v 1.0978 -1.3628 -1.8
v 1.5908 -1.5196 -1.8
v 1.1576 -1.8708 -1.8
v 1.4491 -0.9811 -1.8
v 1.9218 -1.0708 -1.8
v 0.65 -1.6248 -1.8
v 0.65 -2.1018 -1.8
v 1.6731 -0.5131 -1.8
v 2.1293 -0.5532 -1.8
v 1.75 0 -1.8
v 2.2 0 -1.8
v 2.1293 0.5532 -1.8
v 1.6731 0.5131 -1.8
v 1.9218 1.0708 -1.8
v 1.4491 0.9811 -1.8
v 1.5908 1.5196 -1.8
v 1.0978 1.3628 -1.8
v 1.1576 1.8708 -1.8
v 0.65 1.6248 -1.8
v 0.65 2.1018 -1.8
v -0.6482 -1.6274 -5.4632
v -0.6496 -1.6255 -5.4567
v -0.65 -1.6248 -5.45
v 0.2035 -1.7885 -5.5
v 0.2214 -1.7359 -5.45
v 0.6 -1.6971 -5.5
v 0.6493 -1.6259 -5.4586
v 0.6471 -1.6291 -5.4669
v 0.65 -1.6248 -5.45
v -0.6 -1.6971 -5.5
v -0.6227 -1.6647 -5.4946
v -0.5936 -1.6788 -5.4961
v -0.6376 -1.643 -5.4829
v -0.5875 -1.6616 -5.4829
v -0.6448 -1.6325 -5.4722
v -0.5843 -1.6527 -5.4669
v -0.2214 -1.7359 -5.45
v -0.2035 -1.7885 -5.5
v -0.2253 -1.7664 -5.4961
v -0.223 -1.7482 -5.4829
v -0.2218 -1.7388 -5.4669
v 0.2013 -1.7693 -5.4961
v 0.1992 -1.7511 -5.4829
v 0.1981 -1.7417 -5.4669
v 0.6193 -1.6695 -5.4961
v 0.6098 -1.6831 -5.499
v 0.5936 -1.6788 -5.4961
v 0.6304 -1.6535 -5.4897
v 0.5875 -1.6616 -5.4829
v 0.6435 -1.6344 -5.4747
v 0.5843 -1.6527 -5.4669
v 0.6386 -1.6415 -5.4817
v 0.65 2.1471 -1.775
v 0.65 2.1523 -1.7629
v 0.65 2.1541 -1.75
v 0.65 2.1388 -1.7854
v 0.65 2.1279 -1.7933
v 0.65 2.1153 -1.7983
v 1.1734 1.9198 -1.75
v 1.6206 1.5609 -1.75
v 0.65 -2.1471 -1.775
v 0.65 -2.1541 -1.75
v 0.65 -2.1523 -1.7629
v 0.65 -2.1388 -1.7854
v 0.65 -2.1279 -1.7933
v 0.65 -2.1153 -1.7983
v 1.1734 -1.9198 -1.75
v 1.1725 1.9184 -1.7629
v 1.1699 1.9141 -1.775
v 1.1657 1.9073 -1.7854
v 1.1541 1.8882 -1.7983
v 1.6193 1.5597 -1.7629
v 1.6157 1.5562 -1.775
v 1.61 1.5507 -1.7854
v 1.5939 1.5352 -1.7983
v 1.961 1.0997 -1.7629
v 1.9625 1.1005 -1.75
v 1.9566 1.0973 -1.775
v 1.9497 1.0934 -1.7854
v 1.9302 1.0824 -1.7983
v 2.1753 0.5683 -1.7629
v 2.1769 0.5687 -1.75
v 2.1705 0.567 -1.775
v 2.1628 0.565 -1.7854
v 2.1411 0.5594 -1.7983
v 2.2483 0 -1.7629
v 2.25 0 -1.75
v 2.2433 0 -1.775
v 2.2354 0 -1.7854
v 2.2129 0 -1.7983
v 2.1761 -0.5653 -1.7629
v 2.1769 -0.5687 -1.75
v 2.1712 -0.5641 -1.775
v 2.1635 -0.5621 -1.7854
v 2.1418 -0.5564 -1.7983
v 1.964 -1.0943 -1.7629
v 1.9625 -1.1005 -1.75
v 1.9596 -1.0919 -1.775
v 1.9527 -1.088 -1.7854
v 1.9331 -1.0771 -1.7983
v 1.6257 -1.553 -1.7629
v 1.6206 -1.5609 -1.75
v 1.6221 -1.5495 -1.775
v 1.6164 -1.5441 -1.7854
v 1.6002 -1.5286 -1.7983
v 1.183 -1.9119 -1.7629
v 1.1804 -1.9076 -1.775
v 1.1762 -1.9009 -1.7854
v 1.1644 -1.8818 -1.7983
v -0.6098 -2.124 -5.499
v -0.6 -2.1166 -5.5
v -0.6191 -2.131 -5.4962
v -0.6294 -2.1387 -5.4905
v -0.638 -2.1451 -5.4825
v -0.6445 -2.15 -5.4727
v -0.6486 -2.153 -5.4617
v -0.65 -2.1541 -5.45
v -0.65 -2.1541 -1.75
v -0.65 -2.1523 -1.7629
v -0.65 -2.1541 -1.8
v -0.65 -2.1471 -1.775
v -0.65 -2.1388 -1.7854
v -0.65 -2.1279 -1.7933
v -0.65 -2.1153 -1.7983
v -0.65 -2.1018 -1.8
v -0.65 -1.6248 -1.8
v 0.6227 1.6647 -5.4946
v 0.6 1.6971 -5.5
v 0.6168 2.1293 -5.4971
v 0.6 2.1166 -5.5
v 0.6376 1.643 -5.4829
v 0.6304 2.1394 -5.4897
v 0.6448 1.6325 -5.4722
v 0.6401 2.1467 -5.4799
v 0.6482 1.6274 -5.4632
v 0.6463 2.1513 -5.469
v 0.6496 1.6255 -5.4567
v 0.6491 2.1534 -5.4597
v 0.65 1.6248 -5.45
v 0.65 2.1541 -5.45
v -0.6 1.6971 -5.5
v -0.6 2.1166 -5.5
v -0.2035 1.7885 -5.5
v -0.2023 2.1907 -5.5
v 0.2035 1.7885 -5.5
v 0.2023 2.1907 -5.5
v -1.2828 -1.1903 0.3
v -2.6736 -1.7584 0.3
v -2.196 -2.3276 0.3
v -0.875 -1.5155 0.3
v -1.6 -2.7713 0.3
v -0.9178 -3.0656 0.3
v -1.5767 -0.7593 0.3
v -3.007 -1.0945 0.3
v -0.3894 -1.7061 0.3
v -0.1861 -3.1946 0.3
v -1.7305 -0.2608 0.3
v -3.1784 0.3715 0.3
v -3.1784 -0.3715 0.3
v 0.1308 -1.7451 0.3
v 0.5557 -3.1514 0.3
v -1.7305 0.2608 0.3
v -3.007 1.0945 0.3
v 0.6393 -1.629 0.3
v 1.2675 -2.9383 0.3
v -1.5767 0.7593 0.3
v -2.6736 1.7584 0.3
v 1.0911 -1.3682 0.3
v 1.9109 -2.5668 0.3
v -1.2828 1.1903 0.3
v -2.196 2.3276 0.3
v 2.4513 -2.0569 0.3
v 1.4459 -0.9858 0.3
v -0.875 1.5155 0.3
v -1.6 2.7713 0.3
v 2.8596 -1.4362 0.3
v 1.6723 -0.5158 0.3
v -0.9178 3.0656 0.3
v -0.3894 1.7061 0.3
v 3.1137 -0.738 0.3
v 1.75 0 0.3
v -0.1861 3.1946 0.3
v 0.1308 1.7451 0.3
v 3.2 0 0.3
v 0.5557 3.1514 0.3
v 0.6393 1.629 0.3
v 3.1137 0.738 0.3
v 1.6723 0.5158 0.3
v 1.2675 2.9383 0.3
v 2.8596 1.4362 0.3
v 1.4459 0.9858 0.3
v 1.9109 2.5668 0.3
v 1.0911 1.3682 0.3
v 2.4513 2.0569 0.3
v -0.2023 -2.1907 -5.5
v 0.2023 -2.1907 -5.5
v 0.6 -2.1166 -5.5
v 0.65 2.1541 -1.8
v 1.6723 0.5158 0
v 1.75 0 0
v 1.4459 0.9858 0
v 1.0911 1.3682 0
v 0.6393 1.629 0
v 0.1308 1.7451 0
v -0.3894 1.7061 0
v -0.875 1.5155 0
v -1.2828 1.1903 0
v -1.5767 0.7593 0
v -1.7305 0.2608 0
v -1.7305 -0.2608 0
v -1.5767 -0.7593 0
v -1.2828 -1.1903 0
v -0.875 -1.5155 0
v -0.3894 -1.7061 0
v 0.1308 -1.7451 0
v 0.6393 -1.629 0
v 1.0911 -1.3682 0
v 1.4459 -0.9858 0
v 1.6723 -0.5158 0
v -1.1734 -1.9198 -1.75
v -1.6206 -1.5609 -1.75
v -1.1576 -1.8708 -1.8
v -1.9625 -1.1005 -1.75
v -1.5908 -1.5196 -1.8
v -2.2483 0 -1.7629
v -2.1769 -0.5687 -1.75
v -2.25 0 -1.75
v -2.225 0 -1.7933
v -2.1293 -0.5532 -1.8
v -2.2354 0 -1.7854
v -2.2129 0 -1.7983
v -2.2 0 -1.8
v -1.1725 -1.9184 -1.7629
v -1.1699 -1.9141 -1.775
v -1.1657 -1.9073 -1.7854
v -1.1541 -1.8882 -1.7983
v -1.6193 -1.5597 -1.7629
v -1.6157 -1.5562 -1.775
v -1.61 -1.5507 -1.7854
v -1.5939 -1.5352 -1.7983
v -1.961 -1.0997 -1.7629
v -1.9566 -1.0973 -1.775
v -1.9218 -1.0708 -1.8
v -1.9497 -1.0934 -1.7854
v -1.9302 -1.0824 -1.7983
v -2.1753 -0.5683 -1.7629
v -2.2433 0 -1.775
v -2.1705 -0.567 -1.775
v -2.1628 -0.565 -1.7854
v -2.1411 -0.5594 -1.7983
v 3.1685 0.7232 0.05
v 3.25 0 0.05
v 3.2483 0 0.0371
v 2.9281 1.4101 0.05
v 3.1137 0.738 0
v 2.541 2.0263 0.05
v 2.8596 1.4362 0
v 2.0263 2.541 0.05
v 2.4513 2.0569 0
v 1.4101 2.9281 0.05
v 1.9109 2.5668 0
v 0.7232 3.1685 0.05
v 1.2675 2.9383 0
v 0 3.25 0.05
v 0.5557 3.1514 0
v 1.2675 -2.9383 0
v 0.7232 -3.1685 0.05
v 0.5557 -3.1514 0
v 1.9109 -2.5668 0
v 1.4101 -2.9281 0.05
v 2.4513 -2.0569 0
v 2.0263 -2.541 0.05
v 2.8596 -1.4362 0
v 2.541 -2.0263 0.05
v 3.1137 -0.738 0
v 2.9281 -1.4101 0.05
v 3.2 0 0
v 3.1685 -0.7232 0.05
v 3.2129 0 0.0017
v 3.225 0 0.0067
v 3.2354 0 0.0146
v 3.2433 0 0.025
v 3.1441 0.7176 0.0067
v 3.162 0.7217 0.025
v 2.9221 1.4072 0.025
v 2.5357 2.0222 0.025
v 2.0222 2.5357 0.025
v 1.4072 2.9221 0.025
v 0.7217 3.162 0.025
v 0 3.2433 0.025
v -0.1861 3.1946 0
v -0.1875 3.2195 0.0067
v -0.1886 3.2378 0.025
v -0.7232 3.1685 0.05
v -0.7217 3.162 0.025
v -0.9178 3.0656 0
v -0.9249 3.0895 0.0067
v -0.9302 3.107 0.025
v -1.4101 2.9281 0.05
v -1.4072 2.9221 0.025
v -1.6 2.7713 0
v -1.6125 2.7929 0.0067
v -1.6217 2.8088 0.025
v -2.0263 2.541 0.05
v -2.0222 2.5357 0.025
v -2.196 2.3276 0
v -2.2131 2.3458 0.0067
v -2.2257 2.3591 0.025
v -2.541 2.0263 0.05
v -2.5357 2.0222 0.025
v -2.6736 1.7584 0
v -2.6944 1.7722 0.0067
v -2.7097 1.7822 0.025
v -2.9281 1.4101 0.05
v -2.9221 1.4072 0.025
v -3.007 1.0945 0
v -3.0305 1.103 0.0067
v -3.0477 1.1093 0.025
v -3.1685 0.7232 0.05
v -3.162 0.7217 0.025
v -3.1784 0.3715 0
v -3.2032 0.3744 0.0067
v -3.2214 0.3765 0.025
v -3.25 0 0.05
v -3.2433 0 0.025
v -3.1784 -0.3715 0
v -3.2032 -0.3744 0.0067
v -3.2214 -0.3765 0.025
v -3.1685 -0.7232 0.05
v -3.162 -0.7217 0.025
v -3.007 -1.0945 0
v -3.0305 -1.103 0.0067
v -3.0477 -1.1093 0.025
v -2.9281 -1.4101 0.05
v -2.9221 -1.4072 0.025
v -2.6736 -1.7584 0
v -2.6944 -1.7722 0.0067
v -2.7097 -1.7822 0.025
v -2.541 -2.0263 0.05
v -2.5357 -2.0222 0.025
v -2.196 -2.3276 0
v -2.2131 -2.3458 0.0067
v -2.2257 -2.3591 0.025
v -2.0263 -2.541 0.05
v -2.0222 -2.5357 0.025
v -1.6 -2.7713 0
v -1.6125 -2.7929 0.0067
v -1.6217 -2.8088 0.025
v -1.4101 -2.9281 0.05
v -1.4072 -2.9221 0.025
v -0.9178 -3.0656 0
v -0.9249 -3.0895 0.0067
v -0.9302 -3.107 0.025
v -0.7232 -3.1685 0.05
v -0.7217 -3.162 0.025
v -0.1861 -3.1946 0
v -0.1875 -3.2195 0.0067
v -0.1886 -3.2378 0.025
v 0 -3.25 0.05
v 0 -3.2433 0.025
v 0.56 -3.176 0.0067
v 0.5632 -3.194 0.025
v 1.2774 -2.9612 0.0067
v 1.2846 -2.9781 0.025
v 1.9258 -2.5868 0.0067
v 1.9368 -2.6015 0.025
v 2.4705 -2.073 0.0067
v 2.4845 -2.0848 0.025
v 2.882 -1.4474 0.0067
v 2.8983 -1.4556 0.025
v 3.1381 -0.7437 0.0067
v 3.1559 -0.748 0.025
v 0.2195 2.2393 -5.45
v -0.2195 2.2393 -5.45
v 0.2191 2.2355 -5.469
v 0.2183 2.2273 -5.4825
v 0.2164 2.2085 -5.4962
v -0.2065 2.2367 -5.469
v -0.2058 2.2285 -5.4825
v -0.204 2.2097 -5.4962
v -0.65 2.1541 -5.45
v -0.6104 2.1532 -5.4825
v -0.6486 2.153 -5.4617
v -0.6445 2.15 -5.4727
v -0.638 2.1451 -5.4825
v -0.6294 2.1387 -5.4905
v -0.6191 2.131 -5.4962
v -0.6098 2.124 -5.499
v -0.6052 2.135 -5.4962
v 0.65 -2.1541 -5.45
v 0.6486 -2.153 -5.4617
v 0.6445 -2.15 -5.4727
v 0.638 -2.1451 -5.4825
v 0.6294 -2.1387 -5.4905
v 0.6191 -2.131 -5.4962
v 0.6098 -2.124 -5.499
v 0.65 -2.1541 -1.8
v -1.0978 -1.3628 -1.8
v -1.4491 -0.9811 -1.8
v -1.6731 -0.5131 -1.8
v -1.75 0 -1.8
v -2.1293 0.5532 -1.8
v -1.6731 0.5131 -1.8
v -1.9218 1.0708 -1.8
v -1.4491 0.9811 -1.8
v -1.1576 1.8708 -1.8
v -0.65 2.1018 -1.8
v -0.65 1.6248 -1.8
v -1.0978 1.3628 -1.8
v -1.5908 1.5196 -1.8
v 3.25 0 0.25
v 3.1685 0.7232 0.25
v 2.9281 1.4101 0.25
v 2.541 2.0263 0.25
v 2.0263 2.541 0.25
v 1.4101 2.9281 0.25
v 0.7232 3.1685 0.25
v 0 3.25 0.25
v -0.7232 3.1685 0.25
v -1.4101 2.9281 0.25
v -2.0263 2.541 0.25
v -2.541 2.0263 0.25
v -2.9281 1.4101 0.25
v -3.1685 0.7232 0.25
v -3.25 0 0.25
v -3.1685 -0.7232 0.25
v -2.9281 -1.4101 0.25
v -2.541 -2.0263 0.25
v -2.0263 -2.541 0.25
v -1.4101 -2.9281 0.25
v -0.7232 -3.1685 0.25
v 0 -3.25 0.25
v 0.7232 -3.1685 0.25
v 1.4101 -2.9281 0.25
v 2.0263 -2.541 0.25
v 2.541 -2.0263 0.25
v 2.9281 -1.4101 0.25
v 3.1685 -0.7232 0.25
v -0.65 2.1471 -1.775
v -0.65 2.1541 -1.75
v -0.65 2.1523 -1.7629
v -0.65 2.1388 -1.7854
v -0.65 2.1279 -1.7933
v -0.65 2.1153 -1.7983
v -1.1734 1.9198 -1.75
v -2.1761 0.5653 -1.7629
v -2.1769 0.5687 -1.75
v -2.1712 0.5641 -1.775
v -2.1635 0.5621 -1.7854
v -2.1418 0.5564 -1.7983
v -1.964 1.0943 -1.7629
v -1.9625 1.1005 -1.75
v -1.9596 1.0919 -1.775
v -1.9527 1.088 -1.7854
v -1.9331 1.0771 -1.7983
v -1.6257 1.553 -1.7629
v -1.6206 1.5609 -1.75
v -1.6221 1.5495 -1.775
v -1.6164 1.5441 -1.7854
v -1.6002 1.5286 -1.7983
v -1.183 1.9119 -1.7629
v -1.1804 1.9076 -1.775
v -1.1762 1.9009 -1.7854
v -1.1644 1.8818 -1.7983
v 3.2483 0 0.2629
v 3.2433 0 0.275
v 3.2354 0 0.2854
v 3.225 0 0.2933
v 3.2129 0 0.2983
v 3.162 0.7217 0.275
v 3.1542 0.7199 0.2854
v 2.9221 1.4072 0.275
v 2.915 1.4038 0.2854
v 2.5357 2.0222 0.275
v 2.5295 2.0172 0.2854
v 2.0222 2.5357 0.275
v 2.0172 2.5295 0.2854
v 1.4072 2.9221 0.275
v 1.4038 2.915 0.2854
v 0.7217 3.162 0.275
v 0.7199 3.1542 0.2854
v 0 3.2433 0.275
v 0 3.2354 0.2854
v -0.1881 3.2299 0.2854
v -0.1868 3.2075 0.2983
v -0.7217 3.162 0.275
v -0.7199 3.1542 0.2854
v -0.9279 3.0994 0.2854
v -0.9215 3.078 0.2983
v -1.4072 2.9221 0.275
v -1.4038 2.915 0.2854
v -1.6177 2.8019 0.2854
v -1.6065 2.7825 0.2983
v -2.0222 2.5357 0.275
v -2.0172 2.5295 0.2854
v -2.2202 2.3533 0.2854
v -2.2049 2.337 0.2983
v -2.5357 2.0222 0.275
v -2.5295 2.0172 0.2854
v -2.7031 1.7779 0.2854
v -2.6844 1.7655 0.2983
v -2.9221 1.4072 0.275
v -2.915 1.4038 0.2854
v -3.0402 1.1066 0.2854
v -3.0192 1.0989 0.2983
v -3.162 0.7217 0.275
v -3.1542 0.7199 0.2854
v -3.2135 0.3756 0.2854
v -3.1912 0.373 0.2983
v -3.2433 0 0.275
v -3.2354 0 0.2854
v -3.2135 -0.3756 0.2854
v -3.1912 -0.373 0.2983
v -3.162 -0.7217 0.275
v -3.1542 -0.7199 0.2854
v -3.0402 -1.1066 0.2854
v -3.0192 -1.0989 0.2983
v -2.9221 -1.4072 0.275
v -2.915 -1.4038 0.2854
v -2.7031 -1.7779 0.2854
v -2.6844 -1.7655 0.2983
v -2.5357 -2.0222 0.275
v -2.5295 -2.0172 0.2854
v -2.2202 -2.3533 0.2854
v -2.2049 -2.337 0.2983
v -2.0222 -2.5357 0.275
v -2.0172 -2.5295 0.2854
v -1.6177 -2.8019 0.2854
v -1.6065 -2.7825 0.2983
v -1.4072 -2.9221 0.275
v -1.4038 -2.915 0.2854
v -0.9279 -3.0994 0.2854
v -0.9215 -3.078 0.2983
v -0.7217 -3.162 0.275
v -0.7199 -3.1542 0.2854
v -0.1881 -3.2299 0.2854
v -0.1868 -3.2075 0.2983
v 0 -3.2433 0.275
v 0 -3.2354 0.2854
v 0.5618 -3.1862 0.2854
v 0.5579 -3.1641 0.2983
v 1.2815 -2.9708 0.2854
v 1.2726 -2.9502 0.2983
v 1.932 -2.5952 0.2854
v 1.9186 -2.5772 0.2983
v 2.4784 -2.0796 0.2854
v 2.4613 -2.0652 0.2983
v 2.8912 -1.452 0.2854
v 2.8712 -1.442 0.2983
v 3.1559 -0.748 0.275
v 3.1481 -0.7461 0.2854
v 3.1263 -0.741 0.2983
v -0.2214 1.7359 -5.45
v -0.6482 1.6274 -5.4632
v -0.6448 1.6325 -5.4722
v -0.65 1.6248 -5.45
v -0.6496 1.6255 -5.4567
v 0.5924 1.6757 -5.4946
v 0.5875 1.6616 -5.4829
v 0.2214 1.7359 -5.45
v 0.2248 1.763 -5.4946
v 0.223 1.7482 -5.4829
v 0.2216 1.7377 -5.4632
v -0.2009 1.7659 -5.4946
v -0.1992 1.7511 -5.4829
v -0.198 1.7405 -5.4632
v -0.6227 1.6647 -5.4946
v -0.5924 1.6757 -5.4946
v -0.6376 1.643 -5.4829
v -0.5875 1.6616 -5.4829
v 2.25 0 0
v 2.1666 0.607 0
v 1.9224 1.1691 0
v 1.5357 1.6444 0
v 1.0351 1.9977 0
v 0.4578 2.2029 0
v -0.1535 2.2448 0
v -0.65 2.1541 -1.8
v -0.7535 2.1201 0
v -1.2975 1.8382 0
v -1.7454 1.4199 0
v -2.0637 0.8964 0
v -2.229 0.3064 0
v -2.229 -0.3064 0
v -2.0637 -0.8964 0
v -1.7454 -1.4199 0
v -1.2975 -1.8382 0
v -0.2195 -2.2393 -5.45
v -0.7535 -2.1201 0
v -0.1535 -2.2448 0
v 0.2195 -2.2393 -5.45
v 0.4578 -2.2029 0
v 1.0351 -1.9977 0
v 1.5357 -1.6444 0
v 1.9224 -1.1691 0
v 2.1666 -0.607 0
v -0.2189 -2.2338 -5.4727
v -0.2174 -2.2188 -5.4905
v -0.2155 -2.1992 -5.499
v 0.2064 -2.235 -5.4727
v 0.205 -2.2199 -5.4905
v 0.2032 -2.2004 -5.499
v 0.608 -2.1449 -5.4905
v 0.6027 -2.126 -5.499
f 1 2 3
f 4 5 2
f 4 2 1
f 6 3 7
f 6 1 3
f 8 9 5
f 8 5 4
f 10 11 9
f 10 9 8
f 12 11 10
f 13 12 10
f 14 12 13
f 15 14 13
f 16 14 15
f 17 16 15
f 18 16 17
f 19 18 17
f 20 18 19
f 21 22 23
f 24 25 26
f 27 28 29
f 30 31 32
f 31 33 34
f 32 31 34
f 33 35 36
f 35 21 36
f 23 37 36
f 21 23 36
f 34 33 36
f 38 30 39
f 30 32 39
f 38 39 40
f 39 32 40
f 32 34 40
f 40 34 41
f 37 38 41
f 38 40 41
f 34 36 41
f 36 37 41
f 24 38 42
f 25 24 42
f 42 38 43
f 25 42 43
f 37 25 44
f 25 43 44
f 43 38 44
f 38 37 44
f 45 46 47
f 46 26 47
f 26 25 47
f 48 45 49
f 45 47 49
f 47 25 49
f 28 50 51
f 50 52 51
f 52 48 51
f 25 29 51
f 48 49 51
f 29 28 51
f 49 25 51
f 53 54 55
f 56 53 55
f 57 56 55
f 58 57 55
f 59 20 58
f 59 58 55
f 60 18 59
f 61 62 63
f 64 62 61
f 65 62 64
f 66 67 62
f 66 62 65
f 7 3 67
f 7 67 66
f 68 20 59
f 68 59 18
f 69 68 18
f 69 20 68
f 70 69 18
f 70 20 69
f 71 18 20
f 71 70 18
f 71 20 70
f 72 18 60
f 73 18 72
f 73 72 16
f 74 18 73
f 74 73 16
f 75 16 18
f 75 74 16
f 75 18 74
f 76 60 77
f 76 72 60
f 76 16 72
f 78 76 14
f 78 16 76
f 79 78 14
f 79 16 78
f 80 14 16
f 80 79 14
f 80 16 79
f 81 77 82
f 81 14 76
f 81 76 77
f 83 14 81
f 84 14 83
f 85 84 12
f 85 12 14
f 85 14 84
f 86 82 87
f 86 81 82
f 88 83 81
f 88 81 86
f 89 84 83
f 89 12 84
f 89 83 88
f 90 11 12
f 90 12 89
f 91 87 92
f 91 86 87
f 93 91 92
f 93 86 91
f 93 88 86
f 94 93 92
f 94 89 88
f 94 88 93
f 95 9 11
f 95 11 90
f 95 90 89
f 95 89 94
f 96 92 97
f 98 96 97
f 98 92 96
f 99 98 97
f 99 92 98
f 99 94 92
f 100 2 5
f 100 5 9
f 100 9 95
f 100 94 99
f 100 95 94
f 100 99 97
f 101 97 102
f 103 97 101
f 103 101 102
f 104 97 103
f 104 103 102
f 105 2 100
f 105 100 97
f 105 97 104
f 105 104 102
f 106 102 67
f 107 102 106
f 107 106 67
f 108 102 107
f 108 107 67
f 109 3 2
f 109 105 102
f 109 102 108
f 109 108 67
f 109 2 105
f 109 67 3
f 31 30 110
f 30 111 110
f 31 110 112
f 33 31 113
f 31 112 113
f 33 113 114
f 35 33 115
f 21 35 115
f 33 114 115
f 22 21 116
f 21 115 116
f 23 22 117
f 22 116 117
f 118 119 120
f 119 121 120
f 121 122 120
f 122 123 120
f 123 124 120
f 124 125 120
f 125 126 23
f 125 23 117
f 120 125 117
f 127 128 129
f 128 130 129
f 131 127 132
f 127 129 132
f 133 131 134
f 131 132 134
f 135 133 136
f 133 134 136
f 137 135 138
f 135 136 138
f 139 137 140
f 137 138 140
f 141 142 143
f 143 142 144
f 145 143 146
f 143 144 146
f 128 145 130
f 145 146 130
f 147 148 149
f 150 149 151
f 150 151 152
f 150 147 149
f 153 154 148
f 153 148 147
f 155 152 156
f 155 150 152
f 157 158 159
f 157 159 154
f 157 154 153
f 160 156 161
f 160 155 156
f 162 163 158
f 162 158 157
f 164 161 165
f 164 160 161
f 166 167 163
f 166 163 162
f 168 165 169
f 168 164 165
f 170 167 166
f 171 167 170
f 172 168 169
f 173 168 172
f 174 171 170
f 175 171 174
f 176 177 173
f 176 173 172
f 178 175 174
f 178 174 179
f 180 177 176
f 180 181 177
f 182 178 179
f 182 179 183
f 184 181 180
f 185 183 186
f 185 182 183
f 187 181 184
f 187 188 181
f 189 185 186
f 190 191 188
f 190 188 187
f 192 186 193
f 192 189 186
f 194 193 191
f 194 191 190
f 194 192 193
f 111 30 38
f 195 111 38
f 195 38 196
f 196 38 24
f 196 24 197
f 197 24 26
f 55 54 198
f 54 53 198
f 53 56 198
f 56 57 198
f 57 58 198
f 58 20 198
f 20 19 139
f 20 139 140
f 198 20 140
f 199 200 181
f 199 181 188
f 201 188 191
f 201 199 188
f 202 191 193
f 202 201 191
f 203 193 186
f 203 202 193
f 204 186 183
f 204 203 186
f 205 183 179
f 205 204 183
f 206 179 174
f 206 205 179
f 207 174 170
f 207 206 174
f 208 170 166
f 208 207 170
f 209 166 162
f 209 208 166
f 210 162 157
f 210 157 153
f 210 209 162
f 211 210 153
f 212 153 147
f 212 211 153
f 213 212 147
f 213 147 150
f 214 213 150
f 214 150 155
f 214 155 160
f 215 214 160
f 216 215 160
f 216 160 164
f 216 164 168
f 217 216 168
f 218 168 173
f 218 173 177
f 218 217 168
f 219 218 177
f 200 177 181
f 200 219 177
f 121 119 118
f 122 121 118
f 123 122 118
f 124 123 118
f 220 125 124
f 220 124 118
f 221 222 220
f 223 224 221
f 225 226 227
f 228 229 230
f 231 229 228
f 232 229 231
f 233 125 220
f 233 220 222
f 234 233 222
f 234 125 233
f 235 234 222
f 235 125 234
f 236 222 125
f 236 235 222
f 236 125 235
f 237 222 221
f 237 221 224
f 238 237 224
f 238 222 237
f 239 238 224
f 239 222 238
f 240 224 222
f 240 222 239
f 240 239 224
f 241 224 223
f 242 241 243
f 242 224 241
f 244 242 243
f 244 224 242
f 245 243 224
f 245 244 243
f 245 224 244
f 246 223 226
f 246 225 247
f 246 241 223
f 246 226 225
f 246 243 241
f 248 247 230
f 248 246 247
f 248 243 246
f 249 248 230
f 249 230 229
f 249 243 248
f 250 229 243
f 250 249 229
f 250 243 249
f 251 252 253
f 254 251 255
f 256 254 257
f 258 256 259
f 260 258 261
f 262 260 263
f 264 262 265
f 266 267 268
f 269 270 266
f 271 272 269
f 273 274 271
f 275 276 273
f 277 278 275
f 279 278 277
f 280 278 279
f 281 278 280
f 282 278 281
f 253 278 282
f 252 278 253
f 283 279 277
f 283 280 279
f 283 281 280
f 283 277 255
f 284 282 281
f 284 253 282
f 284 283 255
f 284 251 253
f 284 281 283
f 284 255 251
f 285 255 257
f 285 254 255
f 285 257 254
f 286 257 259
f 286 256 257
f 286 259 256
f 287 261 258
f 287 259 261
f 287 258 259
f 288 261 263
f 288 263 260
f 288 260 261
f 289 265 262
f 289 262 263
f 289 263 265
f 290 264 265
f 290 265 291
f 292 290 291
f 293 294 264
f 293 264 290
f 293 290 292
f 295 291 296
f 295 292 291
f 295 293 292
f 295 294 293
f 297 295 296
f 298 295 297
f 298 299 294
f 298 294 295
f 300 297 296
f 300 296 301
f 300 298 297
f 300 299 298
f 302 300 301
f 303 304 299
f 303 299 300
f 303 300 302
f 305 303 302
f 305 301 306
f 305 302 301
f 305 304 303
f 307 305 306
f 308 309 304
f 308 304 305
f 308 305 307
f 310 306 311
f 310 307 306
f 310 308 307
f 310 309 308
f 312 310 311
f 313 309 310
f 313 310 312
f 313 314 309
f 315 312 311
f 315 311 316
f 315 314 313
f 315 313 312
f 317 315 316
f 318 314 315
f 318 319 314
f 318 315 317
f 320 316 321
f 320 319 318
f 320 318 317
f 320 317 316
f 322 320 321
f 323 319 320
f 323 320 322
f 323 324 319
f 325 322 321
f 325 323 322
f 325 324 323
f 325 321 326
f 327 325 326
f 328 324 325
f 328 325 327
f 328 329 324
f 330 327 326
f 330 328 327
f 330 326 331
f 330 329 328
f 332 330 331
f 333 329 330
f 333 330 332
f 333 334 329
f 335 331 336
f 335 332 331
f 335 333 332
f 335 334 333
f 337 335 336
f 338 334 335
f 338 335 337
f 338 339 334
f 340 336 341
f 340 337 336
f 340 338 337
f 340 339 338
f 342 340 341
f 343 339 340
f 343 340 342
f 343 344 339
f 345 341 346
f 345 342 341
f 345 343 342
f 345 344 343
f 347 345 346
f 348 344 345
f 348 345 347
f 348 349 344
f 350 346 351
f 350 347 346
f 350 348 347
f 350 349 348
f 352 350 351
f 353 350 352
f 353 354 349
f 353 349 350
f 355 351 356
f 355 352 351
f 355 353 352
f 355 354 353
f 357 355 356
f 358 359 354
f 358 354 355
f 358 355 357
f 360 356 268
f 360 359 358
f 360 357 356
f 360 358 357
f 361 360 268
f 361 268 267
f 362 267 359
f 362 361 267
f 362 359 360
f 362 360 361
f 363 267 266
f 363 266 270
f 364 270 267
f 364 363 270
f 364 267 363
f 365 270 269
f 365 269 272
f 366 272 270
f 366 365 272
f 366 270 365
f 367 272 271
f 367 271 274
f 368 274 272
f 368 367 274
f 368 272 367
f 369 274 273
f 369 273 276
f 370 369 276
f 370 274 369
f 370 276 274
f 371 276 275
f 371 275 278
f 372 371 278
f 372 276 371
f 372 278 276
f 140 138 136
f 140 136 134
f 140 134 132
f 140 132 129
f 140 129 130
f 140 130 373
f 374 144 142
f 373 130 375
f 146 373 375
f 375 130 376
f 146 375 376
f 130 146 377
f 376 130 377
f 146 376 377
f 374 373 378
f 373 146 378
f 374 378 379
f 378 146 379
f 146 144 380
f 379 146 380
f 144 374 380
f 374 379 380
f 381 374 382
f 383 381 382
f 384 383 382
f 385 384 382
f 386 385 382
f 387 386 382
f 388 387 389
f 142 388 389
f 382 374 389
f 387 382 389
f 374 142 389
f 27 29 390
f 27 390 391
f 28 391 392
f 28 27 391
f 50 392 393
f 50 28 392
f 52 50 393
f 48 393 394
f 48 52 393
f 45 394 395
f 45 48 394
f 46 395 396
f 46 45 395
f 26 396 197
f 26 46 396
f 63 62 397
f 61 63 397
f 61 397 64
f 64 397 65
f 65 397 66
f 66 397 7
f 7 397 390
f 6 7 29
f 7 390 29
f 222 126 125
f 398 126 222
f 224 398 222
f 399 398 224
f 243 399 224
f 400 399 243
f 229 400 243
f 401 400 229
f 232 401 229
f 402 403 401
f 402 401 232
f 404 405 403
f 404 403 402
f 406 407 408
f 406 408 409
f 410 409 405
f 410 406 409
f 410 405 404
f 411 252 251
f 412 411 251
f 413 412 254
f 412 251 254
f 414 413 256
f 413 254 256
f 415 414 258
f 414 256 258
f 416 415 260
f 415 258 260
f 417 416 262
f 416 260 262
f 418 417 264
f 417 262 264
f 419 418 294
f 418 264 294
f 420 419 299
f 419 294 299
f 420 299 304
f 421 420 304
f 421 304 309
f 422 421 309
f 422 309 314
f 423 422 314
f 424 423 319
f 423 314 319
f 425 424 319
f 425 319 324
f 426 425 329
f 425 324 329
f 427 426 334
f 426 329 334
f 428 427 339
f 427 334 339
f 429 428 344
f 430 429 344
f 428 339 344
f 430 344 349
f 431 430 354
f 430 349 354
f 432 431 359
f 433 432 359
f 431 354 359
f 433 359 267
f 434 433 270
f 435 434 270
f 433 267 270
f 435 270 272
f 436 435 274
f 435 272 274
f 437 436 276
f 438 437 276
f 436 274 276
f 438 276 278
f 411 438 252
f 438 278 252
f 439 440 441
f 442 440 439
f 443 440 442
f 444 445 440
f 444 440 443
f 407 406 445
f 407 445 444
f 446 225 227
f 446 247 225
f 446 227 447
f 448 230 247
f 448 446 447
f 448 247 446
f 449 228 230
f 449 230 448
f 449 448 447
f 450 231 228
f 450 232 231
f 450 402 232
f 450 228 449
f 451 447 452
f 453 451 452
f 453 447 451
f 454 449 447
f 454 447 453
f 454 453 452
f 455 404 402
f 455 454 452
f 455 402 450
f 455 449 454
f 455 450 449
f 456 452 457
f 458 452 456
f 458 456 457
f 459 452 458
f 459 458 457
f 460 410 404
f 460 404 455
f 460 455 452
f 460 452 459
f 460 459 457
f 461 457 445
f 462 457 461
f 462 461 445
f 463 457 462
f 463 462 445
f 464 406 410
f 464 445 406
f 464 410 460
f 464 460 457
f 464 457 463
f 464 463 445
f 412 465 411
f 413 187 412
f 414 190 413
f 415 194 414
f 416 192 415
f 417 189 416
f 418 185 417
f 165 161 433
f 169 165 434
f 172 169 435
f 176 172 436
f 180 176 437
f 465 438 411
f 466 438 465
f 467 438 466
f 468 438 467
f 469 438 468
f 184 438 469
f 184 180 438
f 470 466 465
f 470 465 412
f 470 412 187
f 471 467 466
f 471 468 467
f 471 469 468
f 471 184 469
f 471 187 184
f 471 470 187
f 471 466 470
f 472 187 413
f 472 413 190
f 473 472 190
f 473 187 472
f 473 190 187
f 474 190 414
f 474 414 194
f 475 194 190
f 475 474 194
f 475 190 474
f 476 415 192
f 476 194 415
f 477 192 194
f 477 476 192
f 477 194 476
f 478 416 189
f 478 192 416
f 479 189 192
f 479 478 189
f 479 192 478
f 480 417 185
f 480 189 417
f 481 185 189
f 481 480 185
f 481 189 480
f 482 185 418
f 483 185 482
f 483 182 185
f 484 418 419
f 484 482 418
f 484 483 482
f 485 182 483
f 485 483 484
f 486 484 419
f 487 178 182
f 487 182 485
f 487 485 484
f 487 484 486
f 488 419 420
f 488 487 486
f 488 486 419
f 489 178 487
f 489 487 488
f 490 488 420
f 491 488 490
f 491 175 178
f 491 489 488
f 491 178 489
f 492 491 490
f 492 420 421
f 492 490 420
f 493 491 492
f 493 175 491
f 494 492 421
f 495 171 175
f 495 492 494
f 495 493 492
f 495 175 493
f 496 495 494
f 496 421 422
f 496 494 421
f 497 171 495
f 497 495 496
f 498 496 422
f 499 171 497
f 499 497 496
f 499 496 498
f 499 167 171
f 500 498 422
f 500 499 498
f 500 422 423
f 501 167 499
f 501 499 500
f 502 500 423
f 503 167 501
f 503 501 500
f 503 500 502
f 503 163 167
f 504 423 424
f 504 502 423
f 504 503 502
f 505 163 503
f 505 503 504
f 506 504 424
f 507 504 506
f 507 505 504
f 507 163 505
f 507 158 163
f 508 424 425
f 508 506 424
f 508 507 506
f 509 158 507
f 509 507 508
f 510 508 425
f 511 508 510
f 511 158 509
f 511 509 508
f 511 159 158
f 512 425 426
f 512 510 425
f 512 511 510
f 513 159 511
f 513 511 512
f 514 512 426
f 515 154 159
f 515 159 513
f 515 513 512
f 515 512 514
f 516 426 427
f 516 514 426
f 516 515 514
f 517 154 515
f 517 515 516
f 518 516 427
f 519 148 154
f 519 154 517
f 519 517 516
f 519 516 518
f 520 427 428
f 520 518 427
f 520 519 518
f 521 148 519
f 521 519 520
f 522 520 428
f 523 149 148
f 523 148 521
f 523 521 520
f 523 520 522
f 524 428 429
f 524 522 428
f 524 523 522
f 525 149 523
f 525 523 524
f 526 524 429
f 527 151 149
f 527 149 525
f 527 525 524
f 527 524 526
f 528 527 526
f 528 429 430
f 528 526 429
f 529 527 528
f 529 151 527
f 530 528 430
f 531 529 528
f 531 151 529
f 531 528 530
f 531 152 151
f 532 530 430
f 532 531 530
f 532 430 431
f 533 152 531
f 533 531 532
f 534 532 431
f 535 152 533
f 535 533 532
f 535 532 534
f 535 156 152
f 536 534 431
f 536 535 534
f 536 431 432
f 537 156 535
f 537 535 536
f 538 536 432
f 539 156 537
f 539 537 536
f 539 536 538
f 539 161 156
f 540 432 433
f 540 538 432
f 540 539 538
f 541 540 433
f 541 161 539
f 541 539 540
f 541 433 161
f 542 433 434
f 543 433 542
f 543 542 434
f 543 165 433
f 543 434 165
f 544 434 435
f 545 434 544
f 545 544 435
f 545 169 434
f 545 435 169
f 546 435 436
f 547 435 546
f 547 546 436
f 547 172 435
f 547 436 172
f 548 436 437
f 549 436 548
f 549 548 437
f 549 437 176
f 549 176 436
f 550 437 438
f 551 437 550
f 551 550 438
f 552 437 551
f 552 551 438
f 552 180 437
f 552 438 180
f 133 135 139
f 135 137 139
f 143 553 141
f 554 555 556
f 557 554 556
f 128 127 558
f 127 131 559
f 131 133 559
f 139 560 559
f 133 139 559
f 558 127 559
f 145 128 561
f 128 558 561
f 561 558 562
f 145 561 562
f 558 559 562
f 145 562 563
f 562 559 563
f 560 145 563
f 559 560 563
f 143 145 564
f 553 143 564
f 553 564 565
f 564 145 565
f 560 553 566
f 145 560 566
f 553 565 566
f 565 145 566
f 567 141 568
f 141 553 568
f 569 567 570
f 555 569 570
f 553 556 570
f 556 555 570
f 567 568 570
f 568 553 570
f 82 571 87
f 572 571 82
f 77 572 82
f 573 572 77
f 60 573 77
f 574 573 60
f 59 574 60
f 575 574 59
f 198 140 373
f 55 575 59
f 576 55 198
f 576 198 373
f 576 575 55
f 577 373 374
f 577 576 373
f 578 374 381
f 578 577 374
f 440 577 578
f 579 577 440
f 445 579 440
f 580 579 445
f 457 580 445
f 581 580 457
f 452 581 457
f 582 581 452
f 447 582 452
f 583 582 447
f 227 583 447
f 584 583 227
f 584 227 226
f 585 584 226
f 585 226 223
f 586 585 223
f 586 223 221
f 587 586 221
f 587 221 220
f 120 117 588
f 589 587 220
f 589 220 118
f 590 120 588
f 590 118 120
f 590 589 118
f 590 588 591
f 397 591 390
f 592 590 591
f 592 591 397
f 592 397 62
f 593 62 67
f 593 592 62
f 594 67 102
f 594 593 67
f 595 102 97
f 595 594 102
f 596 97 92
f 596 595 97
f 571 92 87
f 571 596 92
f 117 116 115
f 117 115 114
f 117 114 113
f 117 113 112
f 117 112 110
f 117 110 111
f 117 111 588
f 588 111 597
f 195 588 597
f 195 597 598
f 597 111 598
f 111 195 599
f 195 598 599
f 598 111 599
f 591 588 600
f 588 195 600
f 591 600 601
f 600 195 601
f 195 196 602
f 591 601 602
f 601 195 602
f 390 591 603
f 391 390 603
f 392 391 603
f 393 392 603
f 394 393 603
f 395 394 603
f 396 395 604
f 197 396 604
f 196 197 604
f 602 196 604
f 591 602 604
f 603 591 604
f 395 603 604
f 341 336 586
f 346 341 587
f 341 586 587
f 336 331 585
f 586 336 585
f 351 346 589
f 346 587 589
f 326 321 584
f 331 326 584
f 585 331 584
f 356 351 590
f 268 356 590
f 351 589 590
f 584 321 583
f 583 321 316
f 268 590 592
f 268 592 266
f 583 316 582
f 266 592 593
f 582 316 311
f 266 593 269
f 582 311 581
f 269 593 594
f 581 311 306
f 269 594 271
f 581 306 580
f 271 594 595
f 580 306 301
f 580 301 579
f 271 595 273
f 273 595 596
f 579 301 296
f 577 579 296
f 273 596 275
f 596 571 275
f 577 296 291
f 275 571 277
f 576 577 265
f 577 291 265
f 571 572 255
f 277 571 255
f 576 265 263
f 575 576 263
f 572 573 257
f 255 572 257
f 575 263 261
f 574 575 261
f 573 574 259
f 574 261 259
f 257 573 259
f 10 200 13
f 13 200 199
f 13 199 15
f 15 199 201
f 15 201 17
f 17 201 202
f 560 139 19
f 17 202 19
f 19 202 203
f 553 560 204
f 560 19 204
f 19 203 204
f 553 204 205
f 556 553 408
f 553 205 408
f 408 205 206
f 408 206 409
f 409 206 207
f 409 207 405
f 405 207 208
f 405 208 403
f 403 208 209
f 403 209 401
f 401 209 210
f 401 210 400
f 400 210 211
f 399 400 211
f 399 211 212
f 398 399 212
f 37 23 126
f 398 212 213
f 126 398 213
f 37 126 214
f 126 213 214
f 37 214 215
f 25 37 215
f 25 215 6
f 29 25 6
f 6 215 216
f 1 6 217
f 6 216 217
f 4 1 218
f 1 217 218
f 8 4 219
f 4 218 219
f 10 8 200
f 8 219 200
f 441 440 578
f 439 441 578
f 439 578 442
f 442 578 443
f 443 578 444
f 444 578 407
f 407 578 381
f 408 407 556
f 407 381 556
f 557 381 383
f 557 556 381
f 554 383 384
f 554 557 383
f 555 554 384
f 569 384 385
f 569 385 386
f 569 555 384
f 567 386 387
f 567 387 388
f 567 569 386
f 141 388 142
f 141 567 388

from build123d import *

# Parameters (mm, degrees)
SKETCH_1_R          = 3.25
SKETCH_1_R_2        = 2.25
SKETCH_1_R_3        = 1.75
EXTRUDE_1_DEPTH     = 0.3
SKETCH_1_4_R        = 2.25
SKETCH_1_4_R_2      = 1.75
EXTRUDE_2_DEPTH     = 5.5
CUT_EXTRUDE_1_DEPTH = 3.7
FILLET_1_R          = 0.05


with BuildPart() as part:
    # Sketch 1 → Extrude 1 (new body)
    with BuildSketch(Plane.XY):
        Circle(SKETCH_1_R)
        Circle(SKETCH_1_R_2, mode=Mode.SUBTRACT)
        Circle(SKETCH_1_R_2)
        Circle(SKETCH_1_R_3, mode=Mode.SUBTRACT)
    extrude(amount=EXTRUDE_1_DEPTH)

    # Sketch 1_4 → Extrude 2 (add)
    with BuildSketch(Plane.XY):
        Circle(SKETCH_1_4_R)
        Circle(SKETCH_1_4_R_2, mode=Mode.SUBTRACT)
    extrude(amount=-EXTRUDE_2_DEPTH)

    # Sketch 2 → Cut-Extrude 1 (cut)
    with BuildSketch(Plane(origin=(0, 0, -5.5), x_dir=(-1, 0, 0), z_dir=(0, 0, -1))):
        with BuildLine():
            ThreePointArc((-0.65, 2.154065923), (-2.25, 0), (-0.65, -2.154065923))
            Line((-0.65, -2.154065923), (-0.65, -1.624807681))
            ThreePointArc((-0.65, -1.624807681), (-1.75, 0), (-0.65, 1.624807681))
            Line((-0.65, 1.624807681), (-0.65, 2.154065923))
        make_face()
        with BuildLine():
            Line((0.65, -1.624807681), (0.65, -2.154065923))
            ThreePointArc((0.65, -2.154065923), (1.806239187, -1.341640786), (2.25, 0))
            ThreePointArc((2.25, 0), (1.806239187, 1.341640786), (0.65, 2.154065923))
            Line((0.65, 2.154065923), (0.65, 1.624807681))
            ThreePointArc((0.65, 1.624807681), (1.449137675, 0.981070844), (1.75, 0))
            ThreePointArc((1.75, 0), (1.449137675, -0.981070844), (0.65, -1.624807681))
        make_face()
    extrude(amount=-CUT_EXTRUDE_1_DEPTH, mode=Mode.SUBTRACT)

    # Fillet 1
    fillet_1_edges = [part.edges().sort_by_distance(p)[0] for p in [
        (0, 1.75, -5.5),
        (1.806239187, 1.341640786, -1.8),
        (0.65, -1.889436802, -5.5),
        (0.65, 1.889436802, -5.5),
        (0, -2.25, -5.5),
        (0, -1.75, -5.5),
        (-0.65, -1.889436802, -5.5),
        (-0.65, 1.889436802, -5.5),
        (-2.25, 0, -1.8),
        (-3.25, 0, 0),
        (-3.25, 0, 0.3),
        (0, 2.25, -5.5),
    ]]
    fillet(fillet_1_edges, radius=FILLET_1_R)


solid = part.part
